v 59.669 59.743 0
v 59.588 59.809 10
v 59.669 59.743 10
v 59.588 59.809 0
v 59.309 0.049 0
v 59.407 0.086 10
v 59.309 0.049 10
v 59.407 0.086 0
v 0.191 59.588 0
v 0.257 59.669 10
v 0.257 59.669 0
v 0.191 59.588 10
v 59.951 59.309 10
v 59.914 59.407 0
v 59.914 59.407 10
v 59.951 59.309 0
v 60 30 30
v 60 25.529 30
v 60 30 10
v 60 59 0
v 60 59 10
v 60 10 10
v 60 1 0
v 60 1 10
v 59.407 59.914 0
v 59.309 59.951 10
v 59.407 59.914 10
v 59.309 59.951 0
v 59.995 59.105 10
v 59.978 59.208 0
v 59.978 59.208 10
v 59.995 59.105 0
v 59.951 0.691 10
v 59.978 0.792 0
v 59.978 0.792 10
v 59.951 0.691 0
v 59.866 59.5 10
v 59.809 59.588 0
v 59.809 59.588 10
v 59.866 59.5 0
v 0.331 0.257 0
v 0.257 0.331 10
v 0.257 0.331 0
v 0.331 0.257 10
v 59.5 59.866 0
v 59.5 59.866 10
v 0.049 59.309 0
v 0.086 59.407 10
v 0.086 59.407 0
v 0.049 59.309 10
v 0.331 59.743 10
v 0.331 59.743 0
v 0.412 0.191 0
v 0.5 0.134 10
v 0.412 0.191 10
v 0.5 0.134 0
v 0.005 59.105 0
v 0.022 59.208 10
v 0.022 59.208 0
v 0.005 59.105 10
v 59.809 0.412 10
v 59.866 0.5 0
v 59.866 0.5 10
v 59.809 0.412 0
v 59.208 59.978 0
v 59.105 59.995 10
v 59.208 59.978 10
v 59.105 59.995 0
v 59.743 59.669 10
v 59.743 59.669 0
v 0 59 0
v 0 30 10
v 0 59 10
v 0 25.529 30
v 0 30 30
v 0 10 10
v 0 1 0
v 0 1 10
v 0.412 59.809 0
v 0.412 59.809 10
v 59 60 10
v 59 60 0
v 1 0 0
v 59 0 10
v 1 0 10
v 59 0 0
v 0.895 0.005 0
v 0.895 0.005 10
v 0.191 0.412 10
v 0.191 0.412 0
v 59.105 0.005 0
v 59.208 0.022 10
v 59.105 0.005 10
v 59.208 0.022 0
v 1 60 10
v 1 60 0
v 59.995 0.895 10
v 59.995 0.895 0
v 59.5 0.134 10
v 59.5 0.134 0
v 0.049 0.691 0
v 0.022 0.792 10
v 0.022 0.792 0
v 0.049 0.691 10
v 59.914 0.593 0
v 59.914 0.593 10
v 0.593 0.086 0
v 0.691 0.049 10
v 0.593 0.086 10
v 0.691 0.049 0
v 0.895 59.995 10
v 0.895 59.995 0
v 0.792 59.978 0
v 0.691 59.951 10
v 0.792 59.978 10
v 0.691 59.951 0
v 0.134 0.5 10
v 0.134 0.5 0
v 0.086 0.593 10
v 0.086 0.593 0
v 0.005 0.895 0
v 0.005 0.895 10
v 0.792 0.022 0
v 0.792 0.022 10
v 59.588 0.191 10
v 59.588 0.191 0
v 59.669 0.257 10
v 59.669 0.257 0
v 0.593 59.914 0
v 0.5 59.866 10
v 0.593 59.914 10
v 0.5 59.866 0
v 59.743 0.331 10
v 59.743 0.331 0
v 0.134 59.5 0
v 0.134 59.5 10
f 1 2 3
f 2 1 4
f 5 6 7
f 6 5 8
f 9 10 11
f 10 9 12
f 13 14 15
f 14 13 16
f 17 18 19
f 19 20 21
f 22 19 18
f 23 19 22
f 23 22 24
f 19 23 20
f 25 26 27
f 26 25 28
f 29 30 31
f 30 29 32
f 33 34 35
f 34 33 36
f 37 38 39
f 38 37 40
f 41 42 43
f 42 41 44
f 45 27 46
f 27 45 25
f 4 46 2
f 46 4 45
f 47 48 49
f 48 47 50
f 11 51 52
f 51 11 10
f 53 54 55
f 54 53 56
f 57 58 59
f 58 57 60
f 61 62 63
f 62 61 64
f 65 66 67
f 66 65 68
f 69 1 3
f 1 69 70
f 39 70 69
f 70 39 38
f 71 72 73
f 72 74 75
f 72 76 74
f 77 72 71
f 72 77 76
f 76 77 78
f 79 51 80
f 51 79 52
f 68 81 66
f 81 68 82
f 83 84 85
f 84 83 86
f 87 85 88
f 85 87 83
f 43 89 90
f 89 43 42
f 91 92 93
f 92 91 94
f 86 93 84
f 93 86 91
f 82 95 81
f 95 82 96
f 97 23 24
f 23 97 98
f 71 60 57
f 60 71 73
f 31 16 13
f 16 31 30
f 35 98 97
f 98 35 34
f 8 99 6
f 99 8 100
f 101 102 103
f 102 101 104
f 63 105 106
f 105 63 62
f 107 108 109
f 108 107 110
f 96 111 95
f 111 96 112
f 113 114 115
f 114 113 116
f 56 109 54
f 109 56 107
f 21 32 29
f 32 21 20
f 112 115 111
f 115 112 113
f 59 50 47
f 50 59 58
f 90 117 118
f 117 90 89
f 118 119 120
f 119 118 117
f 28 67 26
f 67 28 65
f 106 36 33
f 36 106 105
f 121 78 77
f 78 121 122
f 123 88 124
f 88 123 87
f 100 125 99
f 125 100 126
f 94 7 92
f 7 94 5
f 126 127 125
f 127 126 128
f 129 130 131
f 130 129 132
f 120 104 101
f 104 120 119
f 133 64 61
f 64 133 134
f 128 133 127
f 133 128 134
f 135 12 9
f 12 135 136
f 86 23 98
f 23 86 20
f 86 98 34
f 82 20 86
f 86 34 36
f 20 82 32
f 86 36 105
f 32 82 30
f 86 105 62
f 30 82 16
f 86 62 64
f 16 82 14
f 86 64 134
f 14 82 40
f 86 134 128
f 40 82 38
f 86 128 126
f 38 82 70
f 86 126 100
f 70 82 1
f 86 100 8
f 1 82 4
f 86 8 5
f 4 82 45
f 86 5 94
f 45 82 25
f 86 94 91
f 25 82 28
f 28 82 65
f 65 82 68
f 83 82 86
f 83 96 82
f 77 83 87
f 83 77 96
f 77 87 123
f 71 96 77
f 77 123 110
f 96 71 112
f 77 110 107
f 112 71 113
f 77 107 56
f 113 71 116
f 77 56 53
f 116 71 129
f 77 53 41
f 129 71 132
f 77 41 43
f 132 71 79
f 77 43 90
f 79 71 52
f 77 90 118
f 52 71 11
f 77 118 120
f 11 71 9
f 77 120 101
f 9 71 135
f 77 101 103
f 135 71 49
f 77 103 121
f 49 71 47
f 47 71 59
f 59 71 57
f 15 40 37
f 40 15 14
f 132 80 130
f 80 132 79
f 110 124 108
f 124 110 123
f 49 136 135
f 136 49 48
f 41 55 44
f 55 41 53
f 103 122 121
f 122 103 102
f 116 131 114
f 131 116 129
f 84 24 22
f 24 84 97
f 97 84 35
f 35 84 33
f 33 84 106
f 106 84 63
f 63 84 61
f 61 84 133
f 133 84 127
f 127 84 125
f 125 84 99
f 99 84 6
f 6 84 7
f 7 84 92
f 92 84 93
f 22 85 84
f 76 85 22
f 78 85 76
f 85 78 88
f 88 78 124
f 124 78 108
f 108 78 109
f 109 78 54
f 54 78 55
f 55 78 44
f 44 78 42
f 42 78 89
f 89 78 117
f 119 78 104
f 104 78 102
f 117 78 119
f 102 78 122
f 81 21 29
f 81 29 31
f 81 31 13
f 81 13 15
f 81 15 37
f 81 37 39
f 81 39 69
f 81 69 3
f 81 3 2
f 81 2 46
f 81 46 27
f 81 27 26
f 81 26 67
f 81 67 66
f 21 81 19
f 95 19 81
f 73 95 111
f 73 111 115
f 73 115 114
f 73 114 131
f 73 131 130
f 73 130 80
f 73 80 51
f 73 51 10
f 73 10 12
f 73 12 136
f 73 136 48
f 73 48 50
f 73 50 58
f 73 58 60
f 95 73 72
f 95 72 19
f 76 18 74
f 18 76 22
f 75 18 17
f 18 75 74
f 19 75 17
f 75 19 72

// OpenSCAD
// file: base_shapes/solid_dock_base.scad
// Solid base with rounded corners

module solid_dock_base(x = 60, y = 60, z = 10) {
  corner_radius = 3;
  $fn = 60;
  offset_x = x - corner_radius + 1;
  offset_y = y - corner_radius + 1; 
  offset_z = z - corner_radius;
  translate ([1, 1, 0])
    minkowski() {
      cube([offset_x, offset_y, offset_z]);
      cylinder(corner_radius);
    }
}
// file: base_shapes/backrest.scad
module backrest(x=60, y=20, z=20, angle = 75) {
  function angled_offset() = x * cos(angle);

  function cube_points()  = [
    // create bottom rectangle
    [0, 0, 0],
    [x, 0, 0],
    [x, y, 0],
    [0, y, 0],
    // create top rectangle
    [0, angled_offset(), z],
    [x, angled_offset(), z],
    [x, y, z],
    [0, y, z]
  ];
  
  // cube faces are static so don't need anything fancy
  function cube_faces() = [
    [0,1,2,3],  // bottom
    [4,5,1,0],  // front
    [7,6,5,4],  // top
    [5,6,2,1],  // right
    [6,7,3,2],  // back
    [7,4,0,3]   //left
  ];
  
  polyhedron(cube_points(), cube_faces());
}
// main file
use <base_shapes/backrest.scad>
use <base_shapes/solid_dock_base.scad>


// We follow the rule of 3 around here
// To make it easier, just make all inputs divisible by 3.

length = 60;
width = 60;
height = 10;
lip = height; // There must always be a lip in the front of things here

union() {
  solid_dock_base(length, width, height);
  translate([0, lip, height]) backrest(length, width/3, width/3);
}
